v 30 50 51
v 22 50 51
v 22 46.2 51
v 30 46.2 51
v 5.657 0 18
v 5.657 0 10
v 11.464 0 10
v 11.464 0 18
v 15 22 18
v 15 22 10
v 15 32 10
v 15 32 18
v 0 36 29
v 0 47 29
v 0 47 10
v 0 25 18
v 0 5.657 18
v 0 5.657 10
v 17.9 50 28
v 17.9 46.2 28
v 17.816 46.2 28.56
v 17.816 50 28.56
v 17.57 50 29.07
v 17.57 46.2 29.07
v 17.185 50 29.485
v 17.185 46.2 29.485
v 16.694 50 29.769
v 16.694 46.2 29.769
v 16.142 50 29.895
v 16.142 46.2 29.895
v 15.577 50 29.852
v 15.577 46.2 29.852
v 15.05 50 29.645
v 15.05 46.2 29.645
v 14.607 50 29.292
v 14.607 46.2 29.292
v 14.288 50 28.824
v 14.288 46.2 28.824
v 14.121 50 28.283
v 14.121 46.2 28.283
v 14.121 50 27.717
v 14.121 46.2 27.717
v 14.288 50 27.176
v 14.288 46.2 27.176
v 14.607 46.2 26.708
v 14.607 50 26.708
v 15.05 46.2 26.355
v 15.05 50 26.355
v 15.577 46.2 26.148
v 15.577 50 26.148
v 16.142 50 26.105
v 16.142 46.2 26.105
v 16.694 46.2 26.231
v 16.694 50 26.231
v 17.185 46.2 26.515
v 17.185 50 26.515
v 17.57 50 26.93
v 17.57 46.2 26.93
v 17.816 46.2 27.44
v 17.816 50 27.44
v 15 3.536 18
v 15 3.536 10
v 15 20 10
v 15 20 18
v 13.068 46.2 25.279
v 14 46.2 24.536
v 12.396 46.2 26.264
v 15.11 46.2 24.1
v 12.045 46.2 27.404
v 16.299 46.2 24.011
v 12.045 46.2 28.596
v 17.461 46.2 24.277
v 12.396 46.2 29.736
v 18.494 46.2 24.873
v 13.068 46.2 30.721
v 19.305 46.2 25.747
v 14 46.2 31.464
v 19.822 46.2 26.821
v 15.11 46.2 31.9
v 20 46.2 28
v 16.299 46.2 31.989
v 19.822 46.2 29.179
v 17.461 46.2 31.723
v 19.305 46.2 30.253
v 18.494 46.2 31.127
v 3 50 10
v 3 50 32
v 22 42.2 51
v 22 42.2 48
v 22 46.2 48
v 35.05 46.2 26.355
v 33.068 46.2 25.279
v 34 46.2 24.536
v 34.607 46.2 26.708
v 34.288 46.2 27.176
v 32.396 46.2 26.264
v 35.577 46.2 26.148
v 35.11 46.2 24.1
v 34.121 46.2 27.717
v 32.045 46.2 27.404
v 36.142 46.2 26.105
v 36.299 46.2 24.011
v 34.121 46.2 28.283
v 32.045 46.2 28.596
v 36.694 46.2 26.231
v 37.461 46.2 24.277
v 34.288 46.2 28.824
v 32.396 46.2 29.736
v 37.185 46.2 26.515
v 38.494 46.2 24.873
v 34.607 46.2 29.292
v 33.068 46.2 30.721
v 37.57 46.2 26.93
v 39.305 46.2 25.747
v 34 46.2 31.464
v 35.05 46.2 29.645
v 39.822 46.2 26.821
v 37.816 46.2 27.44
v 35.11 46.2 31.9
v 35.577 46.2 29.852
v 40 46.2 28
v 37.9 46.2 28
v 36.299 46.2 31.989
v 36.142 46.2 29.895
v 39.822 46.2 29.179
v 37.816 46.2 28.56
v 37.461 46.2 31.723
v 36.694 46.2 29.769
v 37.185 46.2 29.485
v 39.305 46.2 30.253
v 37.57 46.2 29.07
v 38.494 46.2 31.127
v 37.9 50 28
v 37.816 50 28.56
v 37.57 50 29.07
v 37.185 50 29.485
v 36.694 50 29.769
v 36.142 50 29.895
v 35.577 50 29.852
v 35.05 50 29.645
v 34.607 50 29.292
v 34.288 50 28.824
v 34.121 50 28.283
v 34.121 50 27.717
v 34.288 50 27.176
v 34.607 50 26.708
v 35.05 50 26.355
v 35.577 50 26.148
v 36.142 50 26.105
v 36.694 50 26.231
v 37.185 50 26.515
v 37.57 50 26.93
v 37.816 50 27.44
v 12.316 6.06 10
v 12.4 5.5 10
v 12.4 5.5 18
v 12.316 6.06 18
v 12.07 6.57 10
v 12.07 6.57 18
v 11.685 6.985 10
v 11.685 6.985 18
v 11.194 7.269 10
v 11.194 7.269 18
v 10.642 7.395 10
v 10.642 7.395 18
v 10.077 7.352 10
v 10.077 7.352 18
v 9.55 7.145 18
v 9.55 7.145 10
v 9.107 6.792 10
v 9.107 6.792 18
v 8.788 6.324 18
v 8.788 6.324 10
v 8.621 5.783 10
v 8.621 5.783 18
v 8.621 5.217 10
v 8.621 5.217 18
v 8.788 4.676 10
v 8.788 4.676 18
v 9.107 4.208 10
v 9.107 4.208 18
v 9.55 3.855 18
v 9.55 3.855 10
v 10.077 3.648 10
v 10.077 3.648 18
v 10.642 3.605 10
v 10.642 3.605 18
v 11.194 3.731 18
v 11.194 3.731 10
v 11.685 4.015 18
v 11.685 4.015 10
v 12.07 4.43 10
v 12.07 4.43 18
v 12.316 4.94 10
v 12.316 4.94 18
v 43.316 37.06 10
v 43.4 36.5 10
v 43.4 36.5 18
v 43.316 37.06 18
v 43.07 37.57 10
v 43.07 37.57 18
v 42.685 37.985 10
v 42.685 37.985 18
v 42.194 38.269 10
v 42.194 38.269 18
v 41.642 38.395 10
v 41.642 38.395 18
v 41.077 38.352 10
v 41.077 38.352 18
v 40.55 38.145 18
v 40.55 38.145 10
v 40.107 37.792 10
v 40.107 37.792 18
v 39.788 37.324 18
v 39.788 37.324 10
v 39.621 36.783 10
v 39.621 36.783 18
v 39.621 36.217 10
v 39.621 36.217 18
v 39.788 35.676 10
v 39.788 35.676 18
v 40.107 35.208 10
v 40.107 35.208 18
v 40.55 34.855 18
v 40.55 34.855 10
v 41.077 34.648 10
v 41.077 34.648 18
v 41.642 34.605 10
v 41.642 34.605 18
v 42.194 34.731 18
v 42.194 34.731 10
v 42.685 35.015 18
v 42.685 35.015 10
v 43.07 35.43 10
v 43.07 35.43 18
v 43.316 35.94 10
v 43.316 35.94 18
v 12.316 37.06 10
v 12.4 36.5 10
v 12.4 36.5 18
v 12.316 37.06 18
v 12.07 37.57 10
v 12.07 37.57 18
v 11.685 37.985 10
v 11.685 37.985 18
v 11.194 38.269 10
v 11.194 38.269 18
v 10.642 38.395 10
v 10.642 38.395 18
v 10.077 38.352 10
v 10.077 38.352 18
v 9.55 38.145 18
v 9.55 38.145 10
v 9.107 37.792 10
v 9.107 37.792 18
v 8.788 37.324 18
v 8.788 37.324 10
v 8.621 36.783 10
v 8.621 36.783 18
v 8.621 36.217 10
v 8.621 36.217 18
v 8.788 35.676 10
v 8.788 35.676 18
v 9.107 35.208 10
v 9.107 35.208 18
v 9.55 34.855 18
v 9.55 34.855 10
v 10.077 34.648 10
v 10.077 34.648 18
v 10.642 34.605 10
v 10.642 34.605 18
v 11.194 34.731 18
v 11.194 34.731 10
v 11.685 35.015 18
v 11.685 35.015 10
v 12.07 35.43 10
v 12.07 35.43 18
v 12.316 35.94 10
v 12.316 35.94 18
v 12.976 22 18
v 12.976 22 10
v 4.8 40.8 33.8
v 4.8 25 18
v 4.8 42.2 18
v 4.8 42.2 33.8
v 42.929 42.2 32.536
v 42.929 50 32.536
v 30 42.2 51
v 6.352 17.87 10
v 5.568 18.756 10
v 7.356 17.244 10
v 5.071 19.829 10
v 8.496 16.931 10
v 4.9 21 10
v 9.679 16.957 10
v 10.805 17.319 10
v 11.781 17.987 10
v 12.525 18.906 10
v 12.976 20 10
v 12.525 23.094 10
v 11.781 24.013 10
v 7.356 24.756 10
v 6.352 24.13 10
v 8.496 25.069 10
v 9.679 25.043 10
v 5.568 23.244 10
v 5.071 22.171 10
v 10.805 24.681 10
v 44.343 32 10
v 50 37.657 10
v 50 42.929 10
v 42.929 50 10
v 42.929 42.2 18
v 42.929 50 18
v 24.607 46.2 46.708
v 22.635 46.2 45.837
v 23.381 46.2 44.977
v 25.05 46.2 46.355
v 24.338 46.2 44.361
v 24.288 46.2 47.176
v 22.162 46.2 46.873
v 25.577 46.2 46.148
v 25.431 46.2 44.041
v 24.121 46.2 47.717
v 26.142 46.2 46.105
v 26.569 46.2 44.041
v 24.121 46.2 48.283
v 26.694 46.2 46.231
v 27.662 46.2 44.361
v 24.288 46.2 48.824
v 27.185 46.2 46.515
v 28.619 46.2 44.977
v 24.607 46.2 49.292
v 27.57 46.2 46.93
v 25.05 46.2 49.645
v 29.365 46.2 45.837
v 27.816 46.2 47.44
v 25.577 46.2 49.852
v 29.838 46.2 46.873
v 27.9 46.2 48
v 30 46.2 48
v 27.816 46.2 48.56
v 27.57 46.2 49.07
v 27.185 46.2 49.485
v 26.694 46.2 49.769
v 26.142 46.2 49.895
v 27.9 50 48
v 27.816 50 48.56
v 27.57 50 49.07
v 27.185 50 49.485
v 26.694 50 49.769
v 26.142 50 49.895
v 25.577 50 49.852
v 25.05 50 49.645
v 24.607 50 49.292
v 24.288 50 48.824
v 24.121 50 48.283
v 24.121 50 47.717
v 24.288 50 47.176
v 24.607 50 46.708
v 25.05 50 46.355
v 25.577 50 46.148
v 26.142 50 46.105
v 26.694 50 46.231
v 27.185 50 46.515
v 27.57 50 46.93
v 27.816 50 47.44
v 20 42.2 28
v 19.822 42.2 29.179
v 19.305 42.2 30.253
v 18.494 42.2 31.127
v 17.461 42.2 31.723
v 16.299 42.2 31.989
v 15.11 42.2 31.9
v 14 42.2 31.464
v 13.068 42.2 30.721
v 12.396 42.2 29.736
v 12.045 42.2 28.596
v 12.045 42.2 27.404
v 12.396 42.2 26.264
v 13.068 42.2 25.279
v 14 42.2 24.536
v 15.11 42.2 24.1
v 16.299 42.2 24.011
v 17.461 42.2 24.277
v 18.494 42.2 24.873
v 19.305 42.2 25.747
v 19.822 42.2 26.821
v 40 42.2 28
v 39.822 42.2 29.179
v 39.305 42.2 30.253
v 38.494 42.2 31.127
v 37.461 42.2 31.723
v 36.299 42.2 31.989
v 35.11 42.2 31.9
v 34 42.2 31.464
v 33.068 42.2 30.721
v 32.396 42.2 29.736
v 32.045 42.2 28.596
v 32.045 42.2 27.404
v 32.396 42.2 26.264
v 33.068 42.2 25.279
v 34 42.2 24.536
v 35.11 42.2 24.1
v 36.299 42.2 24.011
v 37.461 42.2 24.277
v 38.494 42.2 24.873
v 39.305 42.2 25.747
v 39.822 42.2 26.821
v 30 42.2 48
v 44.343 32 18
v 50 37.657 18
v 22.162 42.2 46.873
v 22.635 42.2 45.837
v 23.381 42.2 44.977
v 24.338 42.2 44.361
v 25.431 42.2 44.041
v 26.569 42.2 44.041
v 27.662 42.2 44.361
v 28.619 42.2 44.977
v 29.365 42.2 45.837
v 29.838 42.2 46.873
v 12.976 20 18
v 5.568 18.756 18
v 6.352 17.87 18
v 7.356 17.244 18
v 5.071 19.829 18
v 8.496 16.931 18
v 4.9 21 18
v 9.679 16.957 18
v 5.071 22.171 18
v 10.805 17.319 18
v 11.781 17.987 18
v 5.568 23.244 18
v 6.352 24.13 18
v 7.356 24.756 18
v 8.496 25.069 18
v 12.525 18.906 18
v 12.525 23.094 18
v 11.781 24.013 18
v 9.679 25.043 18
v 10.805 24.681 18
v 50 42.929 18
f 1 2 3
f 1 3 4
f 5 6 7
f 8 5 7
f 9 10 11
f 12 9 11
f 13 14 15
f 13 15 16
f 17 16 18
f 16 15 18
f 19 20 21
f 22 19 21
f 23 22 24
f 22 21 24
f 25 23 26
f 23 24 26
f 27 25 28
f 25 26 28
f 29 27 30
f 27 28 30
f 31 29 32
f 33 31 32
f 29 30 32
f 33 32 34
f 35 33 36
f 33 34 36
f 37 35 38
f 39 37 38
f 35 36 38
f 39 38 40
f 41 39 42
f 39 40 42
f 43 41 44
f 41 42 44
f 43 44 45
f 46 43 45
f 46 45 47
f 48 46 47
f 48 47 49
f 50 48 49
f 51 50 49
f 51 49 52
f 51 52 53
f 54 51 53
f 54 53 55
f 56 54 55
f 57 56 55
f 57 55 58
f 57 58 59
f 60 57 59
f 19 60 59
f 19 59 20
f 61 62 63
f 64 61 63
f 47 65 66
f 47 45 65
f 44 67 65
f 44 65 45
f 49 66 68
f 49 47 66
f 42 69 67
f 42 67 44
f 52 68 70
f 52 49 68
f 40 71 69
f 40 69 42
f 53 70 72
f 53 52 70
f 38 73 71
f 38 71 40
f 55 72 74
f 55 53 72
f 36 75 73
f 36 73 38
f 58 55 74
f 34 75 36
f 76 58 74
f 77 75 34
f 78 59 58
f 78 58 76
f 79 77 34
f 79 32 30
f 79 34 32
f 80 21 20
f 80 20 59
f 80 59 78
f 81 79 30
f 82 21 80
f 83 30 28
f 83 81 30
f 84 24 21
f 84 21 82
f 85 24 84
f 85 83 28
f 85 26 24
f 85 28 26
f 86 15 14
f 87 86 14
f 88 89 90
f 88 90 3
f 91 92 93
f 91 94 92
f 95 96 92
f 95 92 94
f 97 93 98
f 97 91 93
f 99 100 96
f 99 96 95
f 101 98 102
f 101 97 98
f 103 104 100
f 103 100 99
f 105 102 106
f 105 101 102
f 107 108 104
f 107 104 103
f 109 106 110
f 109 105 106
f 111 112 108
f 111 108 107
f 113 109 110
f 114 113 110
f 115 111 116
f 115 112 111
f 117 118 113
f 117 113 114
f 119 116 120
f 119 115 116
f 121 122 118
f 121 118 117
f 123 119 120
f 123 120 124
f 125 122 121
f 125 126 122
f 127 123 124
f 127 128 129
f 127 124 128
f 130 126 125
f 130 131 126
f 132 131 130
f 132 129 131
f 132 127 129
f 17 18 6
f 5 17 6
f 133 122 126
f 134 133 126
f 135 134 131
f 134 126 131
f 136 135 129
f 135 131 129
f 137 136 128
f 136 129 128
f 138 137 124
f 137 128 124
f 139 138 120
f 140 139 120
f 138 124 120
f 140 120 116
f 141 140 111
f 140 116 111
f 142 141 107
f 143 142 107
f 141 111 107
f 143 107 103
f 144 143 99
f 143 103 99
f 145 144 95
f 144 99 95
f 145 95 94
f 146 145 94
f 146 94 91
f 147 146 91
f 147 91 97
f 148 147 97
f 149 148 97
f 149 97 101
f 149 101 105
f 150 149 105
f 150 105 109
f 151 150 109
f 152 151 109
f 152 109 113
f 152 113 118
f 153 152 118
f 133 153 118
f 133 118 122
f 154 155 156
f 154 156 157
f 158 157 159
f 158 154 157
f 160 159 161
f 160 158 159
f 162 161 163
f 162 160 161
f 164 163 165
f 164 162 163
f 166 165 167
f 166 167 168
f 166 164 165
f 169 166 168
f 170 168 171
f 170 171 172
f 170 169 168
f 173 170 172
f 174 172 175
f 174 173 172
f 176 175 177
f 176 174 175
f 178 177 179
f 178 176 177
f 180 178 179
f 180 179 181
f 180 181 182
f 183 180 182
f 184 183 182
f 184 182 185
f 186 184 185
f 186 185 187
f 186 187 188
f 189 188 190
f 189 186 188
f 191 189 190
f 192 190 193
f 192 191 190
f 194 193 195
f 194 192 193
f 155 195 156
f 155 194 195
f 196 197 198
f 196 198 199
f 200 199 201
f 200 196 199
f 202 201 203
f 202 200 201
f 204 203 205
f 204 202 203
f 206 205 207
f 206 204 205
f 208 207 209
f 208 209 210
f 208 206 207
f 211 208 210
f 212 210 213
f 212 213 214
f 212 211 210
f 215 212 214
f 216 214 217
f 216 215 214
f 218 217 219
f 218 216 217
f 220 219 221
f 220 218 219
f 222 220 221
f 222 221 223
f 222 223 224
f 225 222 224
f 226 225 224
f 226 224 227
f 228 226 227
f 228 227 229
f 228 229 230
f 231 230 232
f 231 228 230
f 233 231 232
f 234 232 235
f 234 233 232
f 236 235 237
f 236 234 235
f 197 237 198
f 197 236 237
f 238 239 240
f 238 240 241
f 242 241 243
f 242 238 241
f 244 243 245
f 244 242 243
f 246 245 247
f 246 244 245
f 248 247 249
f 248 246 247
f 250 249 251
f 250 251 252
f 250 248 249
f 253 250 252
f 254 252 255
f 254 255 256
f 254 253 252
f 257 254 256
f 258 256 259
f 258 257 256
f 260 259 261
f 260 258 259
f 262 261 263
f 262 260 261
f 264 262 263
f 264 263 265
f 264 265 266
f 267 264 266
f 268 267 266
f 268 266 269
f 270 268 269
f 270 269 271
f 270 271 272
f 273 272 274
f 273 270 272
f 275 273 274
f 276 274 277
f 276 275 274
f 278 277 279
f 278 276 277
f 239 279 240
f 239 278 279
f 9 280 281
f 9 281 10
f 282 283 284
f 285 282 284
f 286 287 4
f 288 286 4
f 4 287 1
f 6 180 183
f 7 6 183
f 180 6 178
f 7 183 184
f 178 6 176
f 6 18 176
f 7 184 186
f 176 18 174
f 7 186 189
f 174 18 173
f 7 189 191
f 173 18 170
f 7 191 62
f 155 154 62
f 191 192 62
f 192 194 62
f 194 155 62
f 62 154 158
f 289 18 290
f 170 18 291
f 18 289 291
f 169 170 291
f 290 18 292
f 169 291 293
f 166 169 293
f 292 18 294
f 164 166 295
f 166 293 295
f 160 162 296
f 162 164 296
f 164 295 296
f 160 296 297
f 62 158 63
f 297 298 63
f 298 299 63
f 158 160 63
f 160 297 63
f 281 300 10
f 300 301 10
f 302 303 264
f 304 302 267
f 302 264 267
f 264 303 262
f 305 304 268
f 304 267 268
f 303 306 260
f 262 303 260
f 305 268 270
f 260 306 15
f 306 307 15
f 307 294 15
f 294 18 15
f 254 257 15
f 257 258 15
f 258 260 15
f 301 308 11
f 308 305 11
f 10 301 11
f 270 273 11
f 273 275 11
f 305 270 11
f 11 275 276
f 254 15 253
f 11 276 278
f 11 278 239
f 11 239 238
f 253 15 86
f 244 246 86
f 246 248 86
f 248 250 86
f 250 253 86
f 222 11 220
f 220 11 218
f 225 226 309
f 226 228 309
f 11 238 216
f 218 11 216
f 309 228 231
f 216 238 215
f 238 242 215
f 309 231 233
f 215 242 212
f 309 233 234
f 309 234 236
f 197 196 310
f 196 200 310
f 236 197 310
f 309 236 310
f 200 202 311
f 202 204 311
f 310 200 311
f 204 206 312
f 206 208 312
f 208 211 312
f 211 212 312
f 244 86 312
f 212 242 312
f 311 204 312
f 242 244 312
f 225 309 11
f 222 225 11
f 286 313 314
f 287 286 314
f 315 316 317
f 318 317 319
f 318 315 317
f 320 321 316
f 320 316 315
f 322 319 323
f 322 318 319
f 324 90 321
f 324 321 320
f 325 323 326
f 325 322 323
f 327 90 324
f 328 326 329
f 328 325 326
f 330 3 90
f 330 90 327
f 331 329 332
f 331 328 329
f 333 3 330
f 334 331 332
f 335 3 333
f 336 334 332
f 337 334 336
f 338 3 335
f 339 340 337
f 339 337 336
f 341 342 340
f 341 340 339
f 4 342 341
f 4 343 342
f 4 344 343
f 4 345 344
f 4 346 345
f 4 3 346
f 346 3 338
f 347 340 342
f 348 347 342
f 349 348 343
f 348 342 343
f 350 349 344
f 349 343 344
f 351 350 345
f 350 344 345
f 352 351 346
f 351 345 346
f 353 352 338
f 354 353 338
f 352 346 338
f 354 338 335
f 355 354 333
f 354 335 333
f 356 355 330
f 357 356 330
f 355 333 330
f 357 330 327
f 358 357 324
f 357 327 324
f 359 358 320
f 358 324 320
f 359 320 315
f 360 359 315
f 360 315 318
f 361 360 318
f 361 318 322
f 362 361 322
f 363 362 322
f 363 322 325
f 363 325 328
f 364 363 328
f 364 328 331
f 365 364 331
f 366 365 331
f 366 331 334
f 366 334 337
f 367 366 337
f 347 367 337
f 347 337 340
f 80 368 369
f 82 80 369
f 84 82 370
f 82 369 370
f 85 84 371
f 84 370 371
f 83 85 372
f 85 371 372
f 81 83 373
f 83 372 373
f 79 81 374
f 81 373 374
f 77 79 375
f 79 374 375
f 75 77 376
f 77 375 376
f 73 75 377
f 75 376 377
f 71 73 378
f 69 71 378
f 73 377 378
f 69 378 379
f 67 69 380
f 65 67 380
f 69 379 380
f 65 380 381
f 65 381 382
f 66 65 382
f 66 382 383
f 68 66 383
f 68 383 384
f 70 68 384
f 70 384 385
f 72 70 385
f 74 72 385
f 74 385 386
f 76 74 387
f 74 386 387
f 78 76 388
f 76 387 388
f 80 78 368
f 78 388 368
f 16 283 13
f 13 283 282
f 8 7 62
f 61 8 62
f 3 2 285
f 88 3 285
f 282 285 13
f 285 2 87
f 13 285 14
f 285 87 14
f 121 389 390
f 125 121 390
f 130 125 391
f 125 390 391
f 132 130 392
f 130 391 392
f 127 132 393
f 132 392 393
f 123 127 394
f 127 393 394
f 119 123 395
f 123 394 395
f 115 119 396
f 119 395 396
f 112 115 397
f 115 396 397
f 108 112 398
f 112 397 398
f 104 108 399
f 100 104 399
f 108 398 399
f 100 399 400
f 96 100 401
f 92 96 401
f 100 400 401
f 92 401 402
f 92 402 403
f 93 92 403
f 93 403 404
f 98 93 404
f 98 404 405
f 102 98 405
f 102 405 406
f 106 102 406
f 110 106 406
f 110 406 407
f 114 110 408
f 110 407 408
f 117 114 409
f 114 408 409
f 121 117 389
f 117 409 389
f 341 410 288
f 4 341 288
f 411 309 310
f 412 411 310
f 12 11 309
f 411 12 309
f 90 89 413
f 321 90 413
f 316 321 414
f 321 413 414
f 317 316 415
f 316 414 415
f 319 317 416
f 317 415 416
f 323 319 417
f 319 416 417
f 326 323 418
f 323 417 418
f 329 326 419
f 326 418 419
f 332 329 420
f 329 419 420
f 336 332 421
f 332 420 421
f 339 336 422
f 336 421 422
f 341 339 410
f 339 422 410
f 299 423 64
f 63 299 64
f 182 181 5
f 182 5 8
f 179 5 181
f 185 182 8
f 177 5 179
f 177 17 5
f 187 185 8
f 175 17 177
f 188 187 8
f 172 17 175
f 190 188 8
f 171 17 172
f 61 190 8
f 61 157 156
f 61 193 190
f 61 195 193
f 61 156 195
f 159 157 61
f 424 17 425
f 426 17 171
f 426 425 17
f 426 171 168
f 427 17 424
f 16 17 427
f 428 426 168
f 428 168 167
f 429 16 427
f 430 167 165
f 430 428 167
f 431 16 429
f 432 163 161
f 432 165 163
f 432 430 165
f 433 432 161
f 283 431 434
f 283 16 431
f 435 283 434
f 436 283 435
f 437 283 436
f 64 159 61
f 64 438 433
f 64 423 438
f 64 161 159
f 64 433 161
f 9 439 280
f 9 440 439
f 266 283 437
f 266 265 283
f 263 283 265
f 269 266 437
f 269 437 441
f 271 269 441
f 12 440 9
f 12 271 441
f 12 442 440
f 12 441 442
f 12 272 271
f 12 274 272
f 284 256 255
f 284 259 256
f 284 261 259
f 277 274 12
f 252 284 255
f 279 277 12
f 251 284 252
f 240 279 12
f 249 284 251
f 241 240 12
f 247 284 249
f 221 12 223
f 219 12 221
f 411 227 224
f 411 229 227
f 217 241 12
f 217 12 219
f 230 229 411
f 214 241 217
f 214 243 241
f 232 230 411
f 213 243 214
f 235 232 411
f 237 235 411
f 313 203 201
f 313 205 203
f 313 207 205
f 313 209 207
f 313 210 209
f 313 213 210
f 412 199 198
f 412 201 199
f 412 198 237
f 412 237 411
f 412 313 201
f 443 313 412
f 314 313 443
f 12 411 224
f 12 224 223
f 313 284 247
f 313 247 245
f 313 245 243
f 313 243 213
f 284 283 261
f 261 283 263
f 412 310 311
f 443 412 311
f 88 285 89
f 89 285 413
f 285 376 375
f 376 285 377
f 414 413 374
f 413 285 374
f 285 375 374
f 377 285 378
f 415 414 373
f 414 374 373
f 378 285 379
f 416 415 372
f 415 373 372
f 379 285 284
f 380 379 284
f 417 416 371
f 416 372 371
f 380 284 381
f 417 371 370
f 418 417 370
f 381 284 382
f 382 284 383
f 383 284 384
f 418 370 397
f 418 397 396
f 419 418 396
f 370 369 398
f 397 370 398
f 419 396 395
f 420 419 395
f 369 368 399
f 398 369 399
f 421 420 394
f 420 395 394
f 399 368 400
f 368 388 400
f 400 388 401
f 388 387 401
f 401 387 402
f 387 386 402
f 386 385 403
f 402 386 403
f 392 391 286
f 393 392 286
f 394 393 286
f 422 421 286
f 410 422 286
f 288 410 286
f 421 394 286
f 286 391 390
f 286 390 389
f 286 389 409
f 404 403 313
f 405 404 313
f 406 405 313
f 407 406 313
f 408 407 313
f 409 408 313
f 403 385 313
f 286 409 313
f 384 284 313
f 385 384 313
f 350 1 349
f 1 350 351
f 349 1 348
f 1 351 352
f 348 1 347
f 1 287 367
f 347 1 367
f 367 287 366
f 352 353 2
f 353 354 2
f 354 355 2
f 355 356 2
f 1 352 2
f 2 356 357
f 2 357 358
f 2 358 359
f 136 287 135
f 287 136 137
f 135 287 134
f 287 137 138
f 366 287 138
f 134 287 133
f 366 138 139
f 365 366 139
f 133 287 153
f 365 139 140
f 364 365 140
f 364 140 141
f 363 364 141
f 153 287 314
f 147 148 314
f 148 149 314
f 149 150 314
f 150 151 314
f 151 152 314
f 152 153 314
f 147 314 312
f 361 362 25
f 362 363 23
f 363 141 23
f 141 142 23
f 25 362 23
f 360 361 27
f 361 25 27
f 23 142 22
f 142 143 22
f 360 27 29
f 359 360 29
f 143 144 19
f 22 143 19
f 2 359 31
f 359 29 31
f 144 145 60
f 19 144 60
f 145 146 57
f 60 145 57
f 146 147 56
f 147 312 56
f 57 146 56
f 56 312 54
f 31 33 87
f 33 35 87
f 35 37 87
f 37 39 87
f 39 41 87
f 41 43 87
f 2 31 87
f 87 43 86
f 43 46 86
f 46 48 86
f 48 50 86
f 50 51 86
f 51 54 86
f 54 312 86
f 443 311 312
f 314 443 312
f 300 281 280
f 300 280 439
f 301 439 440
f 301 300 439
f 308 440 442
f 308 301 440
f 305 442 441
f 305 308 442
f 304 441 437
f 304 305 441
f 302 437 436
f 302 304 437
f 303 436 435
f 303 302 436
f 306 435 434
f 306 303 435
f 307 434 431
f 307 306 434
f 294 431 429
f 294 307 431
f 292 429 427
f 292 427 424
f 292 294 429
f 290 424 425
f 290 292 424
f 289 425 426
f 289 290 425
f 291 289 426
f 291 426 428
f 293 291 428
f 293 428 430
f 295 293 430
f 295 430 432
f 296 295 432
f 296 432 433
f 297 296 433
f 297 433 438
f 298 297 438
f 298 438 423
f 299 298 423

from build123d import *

# Parameters (mm, degrees)
SKETCH_R        = 1.9
SKETCH_R_2      = 4.1
PAD_DEPTH       = 8
PAD001_DEPTH    = 33
SKETCH002_R     = 1.9
POCKET_DEPTH    = 7.801
POCKET001_DEPTH = 5
POCKET002_DEPTH = 50.001
CHAMFER_SIZE    = 3
SKETCH005_R     = 4
POCKET003_DEPTH = 4
SKETCH006_W     = 2.5
SKETCH006_H     = 2
POCKET004_DEPTH = 8.001


with BuildPart() as part:
    # Sketch → Pad (new body)
    with BuildSketch(Plane.XY.offset(10)):
        Polygon((0, 50), (0, 5.656854), (5.656854, 0), (11.464466, 0), (15, 3.535534), (15, 32), (44.343146, 32), (50, 37.656854), (50, 42.928932), (42.928932, 50), align=None)
        with Locations((41.5, 36.5)):
            Circle(SKETCH_R, mode=Mode.SUBTRACT)
        with Locations((10.5, 36.5)):
            Circle(SKETCH_R, mode=Mode.SUBTRACT)
        with Locations((10.5, 5.5)):
            Circle(SKETCH_R, mode=Mode.SUBTRACT)
        with Locations((9, 21)):
            Circle(SKETCH_R_2, mode=Mode.SUBTRACT)
    extrude(amount=PAD_DEPTH)

    # Sketch001 → Pad001 (new body)
    with BuildSketch(Plane.XY.offset(18)):
        Polygon((42.928932, 50), (0, 50), (0, 25), (4.8, 25), (4.8, 42.2), (42.928932, 42.2), align=None)
    extrude(amount=PAD001_DEPTH)

    # Sketch002 → Pocket (cut, through all)
    with BuildSketch(Plane(origin=(0, 42.2, 10), x_dir=(1, 0, 0), z_dir=(0, -1, 0))):
        with Locations((26, 38)):
            Circle(SKETCH002_R)
        with Locations((16, 18)):
            Circle(SKETCH002_R)
        with Locations((36, 18)):
            Circle(SKETCH002_R)
    extrude(amount=-POCKET_DEPTH, mode=Mode.SUBTRACT)

    # Sketch003 → Pocket001 (cut)
    with BuildSketch(Plane(origin=(4.8, 0, 10), x_dir=(0, 1, 0), z_dir=(1, 0, 0))):
        Polygon((25, 8), (42.2, 25.2), (42.2, 41), (25, 41), align=None)
    extrude(amount=-POCKET001_DEPTH, mode=Mode.SUBTRACT)

    # Sketch004 → Pocket002 (cut, through all)
    with BuildSketch(Plane(origin=(0, 50, 10), x_dir=(-1, 0, 0), z_dir=(0, 1, 0))):
        Polygon((-42.928932, 22.535571), (-30, 41), (-42.928932, 41), align=None)
        Polygon((-22, 41), (0, 19), (0, 41), align=None)
    extrude(amount=-POCKET002_DEPTH, mode=Mode.SUBTRACT)

    # Chamfer
    chamfer_edges = [part.edges().sort_by_distance(p)[0] for p in [
        (0, 50, 23.5),
    ]]
    chamfer(chamfer_edges, length=CHAMFER_SIZE)

    # Sketch005 → Pocket003 (cut)
    with BuildSketch(Plane(origin=(0, 42.2, 10), x_dir=(1, 0, 0), z_dir=(0, -1, 0))):
        with Locations((16, 18)):
            Circle(SKETCH005_R)
        with Locations((36, 18)):
            Circle(SKETCH005_R)
        with BuildLine():
            ThreePointArc((22, 37.999999), (26, 34), (30, 37.999999))
            Line((30, 37.999999), (30, 41))
            Line((22, 41), (30, 41))
            Line((22, 37.999999), (22, 41))
        make_face()
    extrude(amount=-POCKET003_DEPTH, mode=Mode.SUBTRACT)

    # Sketch006 → Pocket004 (cut, through all)
    with BuildSketch(Plane.XY.offset(18)):
        with Locations((13.75, 21)):
            Rectangle(SKETCH006_W, SKETCH006_H)
    extrude(amount=-POCKET004_DEPTH, mode=Mode.SUBTRACT)


solid = part.part
